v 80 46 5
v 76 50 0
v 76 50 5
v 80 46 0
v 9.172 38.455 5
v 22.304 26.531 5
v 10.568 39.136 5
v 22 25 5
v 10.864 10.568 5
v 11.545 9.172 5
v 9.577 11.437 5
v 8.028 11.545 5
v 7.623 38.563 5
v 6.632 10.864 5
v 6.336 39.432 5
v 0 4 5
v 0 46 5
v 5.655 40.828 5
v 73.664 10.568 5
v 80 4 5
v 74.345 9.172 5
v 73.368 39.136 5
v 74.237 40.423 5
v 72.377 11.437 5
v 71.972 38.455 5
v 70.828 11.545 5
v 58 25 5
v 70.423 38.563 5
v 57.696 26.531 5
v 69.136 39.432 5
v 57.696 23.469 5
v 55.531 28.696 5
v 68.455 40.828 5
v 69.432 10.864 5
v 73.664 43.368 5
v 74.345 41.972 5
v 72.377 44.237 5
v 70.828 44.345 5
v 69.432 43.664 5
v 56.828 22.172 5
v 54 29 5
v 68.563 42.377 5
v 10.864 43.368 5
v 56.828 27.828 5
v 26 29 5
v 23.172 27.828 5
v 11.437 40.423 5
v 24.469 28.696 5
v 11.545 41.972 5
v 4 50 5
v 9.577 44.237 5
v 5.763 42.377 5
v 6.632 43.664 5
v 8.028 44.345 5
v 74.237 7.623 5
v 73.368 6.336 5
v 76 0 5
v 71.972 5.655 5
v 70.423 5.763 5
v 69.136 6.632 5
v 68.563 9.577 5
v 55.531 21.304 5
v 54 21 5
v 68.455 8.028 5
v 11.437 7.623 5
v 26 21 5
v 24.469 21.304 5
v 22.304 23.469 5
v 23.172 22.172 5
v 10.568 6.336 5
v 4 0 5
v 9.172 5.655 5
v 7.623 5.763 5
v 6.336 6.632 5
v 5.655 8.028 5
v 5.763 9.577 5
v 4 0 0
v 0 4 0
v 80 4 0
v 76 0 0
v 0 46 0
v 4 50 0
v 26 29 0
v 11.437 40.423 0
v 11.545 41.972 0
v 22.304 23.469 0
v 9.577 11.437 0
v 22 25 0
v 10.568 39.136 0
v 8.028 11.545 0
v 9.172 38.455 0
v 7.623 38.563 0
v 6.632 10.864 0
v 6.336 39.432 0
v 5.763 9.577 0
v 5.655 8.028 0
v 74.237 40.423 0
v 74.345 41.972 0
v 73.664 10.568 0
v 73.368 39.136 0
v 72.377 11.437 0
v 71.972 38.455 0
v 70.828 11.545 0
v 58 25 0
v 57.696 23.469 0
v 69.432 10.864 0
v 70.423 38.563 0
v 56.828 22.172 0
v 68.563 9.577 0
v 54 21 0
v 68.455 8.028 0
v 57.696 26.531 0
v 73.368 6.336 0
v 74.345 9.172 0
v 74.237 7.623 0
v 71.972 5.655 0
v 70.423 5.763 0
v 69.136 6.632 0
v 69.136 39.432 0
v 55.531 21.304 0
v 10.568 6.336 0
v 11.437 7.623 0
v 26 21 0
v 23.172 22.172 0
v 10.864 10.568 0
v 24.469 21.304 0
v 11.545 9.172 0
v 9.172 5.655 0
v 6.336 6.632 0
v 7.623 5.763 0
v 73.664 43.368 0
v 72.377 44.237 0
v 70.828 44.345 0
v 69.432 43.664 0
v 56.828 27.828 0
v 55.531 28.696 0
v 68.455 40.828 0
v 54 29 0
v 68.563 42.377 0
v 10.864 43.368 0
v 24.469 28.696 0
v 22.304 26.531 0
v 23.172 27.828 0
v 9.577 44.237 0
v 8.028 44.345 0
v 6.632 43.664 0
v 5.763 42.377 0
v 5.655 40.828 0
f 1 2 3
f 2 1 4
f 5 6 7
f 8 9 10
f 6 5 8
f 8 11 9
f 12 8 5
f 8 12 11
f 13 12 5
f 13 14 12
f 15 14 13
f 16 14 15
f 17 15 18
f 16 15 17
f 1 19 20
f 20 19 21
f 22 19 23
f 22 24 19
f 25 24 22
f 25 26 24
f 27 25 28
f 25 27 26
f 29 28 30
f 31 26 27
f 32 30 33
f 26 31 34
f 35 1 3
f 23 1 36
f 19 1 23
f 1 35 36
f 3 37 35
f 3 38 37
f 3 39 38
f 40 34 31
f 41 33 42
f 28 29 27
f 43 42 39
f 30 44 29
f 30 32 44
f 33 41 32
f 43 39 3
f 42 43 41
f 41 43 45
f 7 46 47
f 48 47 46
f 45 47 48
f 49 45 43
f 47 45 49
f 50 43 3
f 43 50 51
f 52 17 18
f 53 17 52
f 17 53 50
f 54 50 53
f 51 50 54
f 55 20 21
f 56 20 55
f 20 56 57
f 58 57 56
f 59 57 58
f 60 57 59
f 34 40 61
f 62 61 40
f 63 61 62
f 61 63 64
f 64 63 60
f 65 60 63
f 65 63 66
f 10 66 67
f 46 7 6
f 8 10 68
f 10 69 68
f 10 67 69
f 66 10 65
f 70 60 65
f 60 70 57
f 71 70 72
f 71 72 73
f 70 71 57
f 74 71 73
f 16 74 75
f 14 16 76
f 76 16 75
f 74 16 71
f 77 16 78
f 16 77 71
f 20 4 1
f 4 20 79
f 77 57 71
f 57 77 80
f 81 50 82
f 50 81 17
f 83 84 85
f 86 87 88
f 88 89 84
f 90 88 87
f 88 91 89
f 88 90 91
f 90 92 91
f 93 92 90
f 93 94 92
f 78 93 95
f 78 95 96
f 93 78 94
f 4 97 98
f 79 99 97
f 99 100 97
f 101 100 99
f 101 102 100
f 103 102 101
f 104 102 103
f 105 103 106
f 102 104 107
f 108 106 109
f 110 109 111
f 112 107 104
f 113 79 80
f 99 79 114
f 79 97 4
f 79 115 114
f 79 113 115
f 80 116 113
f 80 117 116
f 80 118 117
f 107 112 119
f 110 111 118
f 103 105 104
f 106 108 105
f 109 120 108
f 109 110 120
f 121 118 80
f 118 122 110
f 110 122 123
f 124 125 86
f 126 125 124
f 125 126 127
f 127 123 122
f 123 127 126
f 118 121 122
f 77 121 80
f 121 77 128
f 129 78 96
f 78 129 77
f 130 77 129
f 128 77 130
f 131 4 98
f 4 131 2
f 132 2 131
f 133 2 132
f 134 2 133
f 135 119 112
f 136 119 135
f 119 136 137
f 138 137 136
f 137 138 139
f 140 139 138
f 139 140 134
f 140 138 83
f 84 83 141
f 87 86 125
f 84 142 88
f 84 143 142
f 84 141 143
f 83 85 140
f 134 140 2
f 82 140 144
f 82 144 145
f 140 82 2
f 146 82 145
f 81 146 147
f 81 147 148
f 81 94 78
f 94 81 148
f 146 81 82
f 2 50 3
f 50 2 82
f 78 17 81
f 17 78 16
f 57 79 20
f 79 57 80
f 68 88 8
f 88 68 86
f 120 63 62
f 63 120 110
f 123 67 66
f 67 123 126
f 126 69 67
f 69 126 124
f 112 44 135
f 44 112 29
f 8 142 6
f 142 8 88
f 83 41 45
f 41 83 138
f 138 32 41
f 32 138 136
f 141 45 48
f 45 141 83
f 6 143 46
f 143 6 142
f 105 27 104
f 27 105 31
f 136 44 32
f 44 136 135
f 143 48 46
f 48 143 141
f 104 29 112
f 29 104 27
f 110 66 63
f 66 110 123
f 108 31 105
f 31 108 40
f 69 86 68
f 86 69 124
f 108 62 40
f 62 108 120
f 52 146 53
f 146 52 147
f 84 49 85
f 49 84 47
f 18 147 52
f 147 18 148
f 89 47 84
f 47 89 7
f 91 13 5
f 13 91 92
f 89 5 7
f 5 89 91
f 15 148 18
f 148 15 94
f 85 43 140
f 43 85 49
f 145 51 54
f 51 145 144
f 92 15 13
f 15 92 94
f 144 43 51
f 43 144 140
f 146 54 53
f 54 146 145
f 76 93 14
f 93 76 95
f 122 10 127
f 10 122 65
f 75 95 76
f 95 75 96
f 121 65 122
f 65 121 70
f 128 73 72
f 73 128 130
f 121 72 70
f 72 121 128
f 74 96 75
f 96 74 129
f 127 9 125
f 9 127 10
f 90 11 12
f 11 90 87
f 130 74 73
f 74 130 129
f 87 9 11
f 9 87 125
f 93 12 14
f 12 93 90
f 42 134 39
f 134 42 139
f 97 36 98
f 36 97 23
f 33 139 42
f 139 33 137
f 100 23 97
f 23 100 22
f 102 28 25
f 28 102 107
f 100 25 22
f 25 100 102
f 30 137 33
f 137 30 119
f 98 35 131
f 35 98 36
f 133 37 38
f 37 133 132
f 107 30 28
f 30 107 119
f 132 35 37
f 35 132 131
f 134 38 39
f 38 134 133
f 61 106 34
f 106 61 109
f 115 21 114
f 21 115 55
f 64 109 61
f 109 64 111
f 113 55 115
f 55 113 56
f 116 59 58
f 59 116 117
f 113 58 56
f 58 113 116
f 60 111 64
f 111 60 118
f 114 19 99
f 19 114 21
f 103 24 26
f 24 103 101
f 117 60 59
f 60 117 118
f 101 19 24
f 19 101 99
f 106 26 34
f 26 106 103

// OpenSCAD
$fn = 32;

// ----------------------------------------------------------------------
// Bracket plate: slot plate 80 x 50
// ----------------------------------------------------------------------

// --- parameters (mm) ---
hole_r = 3;               // bolt hole radius
plate_t = 5;              // plate thickness, Z (extrusion height)
plate_l = 80;             // plate length
plate_w = 50;             // plate width
slot_l = 28;              // slot straight length
slot_r = 4;               // slot end radius

slot_len = slot_l + 2 * slot_r;
slot_w = 2 * slot_r;
hole_d2 = 2 * hole_r;

profile = [[4, 0], [76, 0], [80, 4], [80, 46], [76, 50], [4, 50], [0, 46], [0, 4]];  // primary outline, 8 points, counter clockwise
void_1 = [[54, 21], [55.531, 21.304], [56.828, 22.172], [57.696, 23.469], [58, 25], [57.696, 26.531], [56.828, 27.828], [55.531, 28.696], [54, 29], [26, 29], [24.469, 28.696], [23.172, 27.828], [22.304, 26.531], [22, 25], [22.304, 23.469], [23.172, 22.172], [24.469, 21.304], [26, 21]];  // grip slot, 18 points
void_2 = [[11.545, 41.972], [10.864, 43.368], [9.577, 44.237], [8.028, 44.345], [6.632, 43.664], [5.763, 42.377], [5.655, 40.828], [6.336, 39.432], [7.623, 38.563], [9.172, 38.455], [10.568, 39.136], [11.437, 40.423]];  // corner hole, 12 points
void_3 = [[11.545, 9.172], [10.864, 10.568], [9.577, 11.437], [8.028, 11.545], [6.632, 10.864], [5.763, 9.577], [5.655, 8.028], [6.336, 6.632], [7.623, 5.763], [9.172, 5.655], [10.568, 6.336], [11.437, 7.623]];  // corner hole, 12 points
void_4 = [[74.345, 41.972], [73.664, 43.368], [72.377, 44.237], [70.828, 44.345], [69.432, 43.664], [68.563, 42.377], [68.455, 40.828], [69.136, 39.432], [70.423, 38.563], [71.972, 38.455], [73.368, 39.136], [74.237, 40.423]];  // corner hole, 12 points
void_5 = [[74.345, 9.172], [73.664, 10.568], [72.377, 11.437], [70.828, 11.545], [69.432, 10.864], [68.563, 9.577], [68.455, 8.028], [69.136, 6.632], [70.423, 5.763], [71.972, 5.655], [73.368, 6.336], [74.237, 7.623]];  // corner hole, 12 points

// --- the one profile operation ---
difference() {
  linear_extrude(height = plate_t) polygon(points = profile);
  translate([0, 0, -1])
    linear_extrude(height = plate_t + 2) polygon(points = void_1);
  translate([0, 0, -1])
    linear_extrude(height = plate_t + 2) polygon(points = void_2);
  translate([0, 0, -1])
    linear_extrude(height = plate_t + 2) polygon(points = void_3);
  translate([0, 0, -1])
    linear_extrude(height = plate_t + 2) polygon(points = void_4);
  translate([0, 0, -1])
    linear_extrude(height = plate_t + 2) polygon(points = void_5);
}
